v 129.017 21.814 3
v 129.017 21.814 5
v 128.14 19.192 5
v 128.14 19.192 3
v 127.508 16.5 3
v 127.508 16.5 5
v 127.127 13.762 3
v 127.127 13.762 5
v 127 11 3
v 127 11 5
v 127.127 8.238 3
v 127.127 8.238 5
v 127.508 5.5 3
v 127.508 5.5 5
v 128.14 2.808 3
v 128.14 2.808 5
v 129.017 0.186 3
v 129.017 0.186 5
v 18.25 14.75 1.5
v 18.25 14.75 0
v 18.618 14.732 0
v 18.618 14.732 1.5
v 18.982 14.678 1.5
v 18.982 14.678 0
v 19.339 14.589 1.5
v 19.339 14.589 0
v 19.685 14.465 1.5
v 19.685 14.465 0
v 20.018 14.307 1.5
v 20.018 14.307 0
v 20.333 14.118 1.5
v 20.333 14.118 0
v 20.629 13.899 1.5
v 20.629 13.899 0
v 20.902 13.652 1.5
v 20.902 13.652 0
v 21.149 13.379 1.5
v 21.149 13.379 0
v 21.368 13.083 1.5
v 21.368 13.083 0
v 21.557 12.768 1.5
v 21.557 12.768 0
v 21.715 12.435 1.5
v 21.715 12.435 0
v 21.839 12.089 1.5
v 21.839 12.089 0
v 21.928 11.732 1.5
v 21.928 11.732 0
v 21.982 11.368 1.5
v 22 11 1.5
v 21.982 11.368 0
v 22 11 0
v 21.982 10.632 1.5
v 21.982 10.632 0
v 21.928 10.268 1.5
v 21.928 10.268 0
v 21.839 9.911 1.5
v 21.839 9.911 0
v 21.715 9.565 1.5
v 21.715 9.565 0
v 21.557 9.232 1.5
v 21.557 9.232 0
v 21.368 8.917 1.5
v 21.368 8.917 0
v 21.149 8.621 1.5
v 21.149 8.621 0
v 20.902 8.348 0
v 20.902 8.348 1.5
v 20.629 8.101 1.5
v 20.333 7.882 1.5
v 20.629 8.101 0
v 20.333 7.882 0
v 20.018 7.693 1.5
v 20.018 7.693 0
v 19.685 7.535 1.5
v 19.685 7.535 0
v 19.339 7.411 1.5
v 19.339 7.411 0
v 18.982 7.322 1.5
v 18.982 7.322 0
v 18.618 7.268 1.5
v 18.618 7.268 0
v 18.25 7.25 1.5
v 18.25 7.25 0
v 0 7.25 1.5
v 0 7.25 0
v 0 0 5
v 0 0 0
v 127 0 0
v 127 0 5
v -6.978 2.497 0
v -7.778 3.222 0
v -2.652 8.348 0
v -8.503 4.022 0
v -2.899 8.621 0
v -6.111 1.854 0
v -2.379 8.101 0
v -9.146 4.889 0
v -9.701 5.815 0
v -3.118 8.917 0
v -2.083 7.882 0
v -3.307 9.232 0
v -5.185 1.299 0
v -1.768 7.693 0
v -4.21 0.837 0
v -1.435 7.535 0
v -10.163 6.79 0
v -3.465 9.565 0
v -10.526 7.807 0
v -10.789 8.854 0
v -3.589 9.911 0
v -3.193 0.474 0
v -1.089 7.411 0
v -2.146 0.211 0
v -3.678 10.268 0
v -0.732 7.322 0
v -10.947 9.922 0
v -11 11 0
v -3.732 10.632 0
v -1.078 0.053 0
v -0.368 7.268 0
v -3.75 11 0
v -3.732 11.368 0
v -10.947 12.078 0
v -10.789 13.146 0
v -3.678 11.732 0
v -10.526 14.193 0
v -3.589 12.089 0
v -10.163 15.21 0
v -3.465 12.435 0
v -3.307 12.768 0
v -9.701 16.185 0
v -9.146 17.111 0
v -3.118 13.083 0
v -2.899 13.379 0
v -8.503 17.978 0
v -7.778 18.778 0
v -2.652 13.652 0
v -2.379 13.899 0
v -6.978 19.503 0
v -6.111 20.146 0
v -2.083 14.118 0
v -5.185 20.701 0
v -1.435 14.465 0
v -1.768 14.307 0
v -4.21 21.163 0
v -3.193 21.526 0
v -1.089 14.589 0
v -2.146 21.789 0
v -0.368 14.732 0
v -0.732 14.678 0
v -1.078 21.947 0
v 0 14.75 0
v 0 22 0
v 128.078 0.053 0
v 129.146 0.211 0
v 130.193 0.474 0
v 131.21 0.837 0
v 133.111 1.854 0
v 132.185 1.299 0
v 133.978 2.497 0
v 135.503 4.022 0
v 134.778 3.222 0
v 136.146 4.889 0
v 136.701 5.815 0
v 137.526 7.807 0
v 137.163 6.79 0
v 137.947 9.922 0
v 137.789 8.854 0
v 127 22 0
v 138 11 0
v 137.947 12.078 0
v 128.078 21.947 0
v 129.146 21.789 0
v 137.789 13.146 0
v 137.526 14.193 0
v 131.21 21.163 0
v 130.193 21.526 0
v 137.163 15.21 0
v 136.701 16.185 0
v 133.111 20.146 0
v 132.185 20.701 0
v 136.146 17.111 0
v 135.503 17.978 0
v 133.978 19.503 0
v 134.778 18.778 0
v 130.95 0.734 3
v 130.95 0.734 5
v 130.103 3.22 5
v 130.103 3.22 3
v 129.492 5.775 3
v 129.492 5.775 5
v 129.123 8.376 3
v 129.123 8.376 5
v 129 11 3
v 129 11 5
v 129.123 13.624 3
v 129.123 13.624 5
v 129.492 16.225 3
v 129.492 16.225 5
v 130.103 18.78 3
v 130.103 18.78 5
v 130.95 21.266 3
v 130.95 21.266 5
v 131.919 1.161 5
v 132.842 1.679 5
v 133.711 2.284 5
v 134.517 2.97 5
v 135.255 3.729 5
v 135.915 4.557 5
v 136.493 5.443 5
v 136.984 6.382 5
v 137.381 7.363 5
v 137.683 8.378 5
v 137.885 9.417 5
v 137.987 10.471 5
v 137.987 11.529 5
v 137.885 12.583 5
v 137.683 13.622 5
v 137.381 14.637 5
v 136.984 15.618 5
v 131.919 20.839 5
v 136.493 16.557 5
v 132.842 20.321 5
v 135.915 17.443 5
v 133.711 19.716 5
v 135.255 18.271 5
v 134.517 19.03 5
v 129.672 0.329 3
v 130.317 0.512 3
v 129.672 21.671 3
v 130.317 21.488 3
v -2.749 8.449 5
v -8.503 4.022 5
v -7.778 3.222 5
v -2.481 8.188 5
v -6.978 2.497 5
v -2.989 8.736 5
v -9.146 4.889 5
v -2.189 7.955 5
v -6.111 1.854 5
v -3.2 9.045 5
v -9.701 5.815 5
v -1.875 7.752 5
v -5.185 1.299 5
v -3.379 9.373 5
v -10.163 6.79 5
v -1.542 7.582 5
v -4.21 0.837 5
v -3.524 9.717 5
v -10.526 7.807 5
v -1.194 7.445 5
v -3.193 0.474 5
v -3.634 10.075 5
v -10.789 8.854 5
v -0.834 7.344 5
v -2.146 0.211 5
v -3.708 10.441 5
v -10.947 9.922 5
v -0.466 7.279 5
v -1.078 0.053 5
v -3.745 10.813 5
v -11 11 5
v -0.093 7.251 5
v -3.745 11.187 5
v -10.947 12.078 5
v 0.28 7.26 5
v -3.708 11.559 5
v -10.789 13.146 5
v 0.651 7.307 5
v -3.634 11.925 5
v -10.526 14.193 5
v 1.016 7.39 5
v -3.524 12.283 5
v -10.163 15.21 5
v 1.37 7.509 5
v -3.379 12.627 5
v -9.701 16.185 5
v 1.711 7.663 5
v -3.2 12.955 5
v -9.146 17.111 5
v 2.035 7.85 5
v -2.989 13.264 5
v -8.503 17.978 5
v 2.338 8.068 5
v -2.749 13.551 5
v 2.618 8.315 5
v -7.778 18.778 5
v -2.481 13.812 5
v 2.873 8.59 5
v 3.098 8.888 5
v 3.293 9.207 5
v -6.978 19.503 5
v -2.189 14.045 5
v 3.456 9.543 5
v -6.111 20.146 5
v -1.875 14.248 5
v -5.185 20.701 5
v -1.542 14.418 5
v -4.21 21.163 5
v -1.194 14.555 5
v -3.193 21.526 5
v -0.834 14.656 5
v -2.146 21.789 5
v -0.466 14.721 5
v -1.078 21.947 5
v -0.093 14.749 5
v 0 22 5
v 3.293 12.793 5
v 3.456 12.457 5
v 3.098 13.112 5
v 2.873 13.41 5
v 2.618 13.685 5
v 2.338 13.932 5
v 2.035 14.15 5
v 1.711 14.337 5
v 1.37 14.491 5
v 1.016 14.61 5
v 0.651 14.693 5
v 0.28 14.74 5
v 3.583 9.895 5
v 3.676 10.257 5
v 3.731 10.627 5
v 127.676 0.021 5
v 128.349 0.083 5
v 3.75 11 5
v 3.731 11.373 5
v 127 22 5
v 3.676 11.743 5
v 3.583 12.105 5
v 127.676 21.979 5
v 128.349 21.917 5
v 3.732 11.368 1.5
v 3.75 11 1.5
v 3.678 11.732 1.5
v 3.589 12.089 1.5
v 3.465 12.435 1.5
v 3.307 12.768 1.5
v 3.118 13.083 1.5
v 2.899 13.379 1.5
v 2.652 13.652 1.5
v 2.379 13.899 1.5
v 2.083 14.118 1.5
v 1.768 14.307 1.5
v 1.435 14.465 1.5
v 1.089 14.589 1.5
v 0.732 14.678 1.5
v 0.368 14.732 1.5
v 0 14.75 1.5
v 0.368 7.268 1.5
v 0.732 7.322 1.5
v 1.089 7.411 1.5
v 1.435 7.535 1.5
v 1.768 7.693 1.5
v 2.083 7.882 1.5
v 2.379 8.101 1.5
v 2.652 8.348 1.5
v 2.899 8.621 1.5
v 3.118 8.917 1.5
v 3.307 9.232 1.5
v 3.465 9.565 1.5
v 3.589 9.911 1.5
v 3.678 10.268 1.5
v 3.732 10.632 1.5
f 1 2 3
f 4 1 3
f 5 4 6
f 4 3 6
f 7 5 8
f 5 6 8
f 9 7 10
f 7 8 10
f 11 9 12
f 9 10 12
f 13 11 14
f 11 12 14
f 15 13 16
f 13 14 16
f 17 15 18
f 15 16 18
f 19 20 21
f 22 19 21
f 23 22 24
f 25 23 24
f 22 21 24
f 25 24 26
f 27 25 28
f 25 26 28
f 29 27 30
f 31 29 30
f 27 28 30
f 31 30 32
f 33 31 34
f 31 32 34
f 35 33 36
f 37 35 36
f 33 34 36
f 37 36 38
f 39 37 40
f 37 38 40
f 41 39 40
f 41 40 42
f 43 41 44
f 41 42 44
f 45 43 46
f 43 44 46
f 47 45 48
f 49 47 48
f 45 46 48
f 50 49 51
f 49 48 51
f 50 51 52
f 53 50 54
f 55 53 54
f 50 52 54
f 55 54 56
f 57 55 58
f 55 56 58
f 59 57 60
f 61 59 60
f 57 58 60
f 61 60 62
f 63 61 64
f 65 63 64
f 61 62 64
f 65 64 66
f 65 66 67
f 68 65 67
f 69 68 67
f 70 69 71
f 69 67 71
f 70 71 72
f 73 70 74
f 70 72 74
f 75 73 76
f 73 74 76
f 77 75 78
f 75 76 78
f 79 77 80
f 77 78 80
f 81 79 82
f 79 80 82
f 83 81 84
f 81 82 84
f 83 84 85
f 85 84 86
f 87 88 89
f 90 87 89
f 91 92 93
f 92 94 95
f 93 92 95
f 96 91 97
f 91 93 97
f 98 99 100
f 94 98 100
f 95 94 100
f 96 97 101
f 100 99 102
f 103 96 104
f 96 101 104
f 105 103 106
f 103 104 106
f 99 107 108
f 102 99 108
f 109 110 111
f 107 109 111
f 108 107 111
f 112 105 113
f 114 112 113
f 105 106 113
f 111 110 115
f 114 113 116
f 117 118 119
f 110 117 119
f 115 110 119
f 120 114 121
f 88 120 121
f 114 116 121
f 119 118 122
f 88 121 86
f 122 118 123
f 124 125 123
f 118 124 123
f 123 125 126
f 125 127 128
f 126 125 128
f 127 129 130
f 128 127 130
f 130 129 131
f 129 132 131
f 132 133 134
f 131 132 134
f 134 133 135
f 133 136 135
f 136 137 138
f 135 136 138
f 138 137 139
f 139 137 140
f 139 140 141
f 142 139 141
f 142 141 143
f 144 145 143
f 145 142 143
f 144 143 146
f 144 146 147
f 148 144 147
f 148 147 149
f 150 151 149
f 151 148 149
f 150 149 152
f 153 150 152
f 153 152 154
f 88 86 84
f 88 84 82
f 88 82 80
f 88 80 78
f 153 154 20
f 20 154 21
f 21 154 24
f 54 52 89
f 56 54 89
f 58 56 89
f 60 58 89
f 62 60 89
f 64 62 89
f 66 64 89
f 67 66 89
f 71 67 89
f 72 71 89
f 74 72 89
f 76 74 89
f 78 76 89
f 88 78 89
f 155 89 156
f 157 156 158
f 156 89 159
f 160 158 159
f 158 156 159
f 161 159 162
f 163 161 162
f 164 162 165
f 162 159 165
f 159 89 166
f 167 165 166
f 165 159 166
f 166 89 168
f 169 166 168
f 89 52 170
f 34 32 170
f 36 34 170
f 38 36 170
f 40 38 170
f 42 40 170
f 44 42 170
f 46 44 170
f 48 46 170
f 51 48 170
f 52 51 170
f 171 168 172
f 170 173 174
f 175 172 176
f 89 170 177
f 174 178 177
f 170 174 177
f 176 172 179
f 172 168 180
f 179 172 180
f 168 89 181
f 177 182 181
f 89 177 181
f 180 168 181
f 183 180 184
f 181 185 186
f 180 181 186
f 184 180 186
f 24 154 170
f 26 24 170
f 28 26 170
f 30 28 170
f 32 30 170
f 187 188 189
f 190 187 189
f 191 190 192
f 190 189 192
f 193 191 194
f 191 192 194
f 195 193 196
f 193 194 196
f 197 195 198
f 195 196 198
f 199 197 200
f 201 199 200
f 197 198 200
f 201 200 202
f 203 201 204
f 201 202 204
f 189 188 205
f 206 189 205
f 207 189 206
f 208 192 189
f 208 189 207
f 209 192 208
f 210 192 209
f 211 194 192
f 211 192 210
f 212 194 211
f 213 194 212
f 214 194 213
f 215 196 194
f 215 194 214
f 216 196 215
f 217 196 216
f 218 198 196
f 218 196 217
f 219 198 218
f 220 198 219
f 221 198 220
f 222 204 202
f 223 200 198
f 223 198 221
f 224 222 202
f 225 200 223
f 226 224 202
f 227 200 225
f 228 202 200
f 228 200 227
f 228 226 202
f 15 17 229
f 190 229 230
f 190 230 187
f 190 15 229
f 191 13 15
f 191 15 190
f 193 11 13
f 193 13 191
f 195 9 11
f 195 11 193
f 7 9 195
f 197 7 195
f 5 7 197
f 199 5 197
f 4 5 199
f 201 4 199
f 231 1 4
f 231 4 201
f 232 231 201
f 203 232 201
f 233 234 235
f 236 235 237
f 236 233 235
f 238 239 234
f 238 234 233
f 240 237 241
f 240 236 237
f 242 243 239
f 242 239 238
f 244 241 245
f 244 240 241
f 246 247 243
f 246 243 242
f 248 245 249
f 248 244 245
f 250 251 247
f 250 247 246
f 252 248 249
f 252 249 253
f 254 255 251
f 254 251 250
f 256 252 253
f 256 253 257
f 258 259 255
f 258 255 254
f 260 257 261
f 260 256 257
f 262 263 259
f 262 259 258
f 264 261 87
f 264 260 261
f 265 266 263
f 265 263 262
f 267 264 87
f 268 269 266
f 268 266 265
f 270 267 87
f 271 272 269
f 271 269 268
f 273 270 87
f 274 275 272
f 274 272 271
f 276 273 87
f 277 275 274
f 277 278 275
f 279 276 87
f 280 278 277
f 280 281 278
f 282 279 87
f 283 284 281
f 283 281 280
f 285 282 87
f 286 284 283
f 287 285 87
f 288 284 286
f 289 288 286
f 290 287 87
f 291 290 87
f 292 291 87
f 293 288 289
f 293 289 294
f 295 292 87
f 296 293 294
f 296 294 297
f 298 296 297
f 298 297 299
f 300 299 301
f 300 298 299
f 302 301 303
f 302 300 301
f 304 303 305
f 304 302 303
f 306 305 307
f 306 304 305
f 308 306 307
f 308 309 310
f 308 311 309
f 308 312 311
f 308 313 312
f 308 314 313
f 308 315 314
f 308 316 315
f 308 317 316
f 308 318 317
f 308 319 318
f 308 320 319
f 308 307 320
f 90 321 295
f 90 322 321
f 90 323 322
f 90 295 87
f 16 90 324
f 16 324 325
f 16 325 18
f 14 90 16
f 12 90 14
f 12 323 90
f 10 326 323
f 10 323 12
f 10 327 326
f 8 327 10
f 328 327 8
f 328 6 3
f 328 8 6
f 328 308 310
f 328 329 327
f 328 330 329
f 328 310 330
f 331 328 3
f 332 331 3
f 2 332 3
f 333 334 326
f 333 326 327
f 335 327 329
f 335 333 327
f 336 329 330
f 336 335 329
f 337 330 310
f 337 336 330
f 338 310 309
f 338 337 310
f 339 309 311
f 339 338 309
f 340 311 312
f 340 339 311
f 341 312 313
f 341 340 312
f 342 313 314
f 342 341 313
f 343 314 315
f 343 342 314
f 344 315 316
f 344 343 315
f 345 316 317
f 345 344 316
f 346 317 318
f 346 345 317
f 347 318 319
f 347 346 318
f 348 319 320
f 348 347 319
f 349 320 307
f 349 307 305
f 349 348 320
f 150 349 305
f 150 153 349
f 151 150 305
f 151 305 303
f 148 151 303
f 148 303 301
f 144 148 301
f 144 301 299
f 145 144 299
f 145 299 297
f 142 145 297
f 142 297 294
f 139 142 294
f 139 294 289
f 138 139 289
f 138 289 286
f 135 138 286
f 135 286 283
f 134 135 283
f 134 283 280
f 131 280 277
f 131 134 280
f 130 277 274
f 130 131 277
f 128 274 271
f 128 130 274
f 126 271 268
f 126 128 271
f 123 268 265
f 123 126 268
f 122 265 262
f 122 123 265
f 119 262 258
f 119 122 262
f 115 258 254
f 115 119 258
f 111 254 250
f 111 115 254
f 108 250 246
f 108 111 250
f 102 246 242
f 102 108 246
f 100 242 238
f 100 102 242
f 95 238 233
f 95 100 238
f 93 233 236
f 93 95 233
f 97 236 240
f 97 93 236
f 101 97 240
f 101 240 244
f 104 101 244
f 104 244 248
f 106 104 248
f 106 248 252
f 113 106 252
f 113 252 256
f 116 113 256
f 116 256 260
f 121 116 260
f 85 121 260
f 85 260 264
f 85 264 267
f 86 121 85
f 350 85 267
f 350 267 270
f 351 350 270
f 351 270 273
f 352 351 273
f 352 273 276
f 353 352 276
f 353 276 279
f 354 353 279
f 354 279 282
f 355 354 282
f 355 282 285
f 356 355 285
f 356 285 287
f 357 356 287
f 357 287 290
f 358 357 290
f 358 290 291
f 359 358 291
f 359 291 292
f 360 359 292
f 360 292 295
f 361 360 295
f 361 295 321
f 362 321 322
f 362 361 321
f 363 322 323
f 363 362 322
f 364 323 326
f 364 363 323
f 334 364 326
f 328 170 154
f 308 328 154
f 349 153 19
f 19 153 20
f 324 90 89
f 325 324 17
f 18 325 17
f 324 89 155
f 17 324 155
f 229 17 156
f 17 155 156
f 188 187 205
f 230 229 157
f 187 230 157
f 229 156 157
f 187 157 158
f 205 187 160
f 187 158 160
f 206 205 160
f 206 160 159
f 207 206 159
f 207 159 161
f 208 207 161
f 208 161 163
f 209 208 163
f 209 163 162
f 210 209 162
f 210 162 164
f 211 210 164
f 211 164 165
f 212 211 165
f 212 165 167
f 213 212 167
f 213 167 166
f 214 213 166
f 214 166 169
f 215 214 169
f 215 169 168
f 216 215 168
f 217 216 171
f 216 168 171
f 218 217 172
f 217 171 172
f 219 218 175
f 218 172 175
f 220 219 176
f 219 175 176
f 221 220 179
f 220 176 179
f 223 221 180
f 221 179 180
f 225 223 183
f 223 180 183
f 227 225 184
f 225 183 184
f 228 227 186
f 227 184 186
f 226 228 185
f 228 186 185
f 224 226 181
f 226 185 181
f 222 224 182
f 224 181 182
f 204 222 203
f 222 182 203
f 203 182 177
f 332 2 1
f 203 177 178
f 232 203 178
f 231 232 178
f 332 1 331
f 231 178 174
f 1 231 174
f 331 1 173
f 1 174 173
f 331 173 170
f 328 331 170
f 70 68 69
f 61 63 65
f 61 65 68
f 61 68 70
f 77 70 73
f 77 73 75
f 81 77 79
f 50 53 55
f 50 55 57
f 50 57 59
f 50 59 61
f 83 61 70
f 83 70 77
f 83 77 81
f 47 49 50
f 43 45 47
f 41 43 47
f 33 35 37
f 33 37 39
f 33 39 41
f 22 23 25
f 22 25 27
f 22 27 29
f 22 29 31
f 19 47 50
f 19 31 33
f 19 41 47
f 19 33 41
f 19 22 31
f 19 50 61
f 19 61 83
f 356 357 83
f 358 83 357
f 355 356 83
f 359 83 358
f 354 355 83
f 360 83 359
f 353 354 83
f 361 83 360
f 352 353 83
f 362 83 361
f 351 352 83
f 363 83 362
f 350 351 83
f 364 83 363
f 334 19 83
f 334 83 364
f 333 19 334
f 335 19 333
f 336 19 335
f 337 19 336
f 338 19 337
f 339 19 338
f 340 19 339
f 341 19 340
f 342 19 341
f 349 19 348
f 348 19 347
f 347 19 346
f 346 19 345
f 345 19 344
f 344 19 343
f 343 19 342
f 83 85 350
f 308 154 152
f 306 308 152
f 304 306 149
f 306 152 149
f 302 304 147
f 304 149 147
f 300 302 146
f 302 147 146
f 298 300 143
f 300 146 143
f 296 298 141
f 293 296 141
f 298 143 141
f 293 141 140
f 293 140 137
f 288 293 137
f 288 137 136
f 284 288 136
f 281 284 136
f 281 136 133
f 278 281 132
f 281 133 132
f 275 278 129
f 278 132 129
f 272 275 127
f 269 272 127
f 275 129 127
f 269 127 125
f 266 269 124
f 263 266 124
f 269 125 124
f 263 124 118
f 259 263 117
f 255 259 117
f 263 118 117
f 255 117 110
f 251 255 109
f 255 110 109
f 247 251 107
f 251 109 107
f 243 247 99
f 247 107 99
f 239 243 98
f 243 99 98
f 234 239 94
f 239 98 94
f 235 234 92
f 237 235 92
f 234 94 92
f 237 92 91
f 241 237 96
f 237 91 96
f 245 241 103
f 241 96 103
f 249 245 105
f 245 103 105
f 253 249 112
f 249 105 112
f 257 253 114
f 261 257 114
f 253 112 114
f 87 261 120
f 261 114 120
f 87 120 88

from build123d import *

# Parameters (mm, degrees)
SKETCH1_R           = 3.75
BOSS_EXTRUDE1_DEPTH = 5
CUT_EXTRUDE1_DEPTH  = 2
CUT_EXTRUDE2_DEPTH  = 1.5


with BuildPart() as part:
    # Sketch1 → Boss-Extrude1 (new body)
    with BuildSketch(Plane.XY):
        with BuildLine():
            ThreePointArc((0, 22), (-11, 11), (0, 0))
            Line((0, 0), (127, 0))
            ThreePointArc((127, 0), (138, 11), (127, 22))
            Line((127, 22), (0, 22))
        make_face()
        with Locations((0, 11)):
            Circle(SKETCH1_R, mode=Mode.SUBTRACT)
    extrude(amount=BOSS_EXTRUDE1_DEPTH)

    # Sketch2 → Cut-Extrude1 (cut)
    with BuildSketch(Plane.XY.offset(5)):
        with BuildLine():
            ThreePointArc((129.016666667, 21.813558876), (127, 11), (129.016666667, 0.186441124))
            ThreePointArc((129.016666667, 0.186441124), (129.995854312, 0.415820441), (130.95, 0.733671542))
            ThreePointArc((130.95, 0.733671542), (129, 11), (130.95, 21.266328458))
            ThreePointArc((130.95, 21.266328458), (129.995854312, 21.584179559), (129.016666667, 21.813558876))
        make_face()
    extrude(amount=-CUT_EXTRUDE1_DEPTH, mode=Mode.SUBTRACT)

    # Sketch3 → Cut-Extrude2 (cut)
    with BuildSketch(Plane(origin=(0, 0, 0), x_dir=(-1, 0, 0), z_dir=(0, 0, -1))):
        with BuildLine():
            Line((0, 14.75), (-18.25, 14.75))
            ThreePointArc((-18.25, 14.75), (-22, 11), (-18.25, 7.25))
            Line((-18.25, 7.25), (0, 7.25))
            ThreePointArc((0, 7.25), (-3.75, 11), (0, 14.75))
        make_face()
    extrude(amount=-CUT_EXTRUDE2_DEPTH, mode=Mode.SUBTRACT)


solid = part.part
